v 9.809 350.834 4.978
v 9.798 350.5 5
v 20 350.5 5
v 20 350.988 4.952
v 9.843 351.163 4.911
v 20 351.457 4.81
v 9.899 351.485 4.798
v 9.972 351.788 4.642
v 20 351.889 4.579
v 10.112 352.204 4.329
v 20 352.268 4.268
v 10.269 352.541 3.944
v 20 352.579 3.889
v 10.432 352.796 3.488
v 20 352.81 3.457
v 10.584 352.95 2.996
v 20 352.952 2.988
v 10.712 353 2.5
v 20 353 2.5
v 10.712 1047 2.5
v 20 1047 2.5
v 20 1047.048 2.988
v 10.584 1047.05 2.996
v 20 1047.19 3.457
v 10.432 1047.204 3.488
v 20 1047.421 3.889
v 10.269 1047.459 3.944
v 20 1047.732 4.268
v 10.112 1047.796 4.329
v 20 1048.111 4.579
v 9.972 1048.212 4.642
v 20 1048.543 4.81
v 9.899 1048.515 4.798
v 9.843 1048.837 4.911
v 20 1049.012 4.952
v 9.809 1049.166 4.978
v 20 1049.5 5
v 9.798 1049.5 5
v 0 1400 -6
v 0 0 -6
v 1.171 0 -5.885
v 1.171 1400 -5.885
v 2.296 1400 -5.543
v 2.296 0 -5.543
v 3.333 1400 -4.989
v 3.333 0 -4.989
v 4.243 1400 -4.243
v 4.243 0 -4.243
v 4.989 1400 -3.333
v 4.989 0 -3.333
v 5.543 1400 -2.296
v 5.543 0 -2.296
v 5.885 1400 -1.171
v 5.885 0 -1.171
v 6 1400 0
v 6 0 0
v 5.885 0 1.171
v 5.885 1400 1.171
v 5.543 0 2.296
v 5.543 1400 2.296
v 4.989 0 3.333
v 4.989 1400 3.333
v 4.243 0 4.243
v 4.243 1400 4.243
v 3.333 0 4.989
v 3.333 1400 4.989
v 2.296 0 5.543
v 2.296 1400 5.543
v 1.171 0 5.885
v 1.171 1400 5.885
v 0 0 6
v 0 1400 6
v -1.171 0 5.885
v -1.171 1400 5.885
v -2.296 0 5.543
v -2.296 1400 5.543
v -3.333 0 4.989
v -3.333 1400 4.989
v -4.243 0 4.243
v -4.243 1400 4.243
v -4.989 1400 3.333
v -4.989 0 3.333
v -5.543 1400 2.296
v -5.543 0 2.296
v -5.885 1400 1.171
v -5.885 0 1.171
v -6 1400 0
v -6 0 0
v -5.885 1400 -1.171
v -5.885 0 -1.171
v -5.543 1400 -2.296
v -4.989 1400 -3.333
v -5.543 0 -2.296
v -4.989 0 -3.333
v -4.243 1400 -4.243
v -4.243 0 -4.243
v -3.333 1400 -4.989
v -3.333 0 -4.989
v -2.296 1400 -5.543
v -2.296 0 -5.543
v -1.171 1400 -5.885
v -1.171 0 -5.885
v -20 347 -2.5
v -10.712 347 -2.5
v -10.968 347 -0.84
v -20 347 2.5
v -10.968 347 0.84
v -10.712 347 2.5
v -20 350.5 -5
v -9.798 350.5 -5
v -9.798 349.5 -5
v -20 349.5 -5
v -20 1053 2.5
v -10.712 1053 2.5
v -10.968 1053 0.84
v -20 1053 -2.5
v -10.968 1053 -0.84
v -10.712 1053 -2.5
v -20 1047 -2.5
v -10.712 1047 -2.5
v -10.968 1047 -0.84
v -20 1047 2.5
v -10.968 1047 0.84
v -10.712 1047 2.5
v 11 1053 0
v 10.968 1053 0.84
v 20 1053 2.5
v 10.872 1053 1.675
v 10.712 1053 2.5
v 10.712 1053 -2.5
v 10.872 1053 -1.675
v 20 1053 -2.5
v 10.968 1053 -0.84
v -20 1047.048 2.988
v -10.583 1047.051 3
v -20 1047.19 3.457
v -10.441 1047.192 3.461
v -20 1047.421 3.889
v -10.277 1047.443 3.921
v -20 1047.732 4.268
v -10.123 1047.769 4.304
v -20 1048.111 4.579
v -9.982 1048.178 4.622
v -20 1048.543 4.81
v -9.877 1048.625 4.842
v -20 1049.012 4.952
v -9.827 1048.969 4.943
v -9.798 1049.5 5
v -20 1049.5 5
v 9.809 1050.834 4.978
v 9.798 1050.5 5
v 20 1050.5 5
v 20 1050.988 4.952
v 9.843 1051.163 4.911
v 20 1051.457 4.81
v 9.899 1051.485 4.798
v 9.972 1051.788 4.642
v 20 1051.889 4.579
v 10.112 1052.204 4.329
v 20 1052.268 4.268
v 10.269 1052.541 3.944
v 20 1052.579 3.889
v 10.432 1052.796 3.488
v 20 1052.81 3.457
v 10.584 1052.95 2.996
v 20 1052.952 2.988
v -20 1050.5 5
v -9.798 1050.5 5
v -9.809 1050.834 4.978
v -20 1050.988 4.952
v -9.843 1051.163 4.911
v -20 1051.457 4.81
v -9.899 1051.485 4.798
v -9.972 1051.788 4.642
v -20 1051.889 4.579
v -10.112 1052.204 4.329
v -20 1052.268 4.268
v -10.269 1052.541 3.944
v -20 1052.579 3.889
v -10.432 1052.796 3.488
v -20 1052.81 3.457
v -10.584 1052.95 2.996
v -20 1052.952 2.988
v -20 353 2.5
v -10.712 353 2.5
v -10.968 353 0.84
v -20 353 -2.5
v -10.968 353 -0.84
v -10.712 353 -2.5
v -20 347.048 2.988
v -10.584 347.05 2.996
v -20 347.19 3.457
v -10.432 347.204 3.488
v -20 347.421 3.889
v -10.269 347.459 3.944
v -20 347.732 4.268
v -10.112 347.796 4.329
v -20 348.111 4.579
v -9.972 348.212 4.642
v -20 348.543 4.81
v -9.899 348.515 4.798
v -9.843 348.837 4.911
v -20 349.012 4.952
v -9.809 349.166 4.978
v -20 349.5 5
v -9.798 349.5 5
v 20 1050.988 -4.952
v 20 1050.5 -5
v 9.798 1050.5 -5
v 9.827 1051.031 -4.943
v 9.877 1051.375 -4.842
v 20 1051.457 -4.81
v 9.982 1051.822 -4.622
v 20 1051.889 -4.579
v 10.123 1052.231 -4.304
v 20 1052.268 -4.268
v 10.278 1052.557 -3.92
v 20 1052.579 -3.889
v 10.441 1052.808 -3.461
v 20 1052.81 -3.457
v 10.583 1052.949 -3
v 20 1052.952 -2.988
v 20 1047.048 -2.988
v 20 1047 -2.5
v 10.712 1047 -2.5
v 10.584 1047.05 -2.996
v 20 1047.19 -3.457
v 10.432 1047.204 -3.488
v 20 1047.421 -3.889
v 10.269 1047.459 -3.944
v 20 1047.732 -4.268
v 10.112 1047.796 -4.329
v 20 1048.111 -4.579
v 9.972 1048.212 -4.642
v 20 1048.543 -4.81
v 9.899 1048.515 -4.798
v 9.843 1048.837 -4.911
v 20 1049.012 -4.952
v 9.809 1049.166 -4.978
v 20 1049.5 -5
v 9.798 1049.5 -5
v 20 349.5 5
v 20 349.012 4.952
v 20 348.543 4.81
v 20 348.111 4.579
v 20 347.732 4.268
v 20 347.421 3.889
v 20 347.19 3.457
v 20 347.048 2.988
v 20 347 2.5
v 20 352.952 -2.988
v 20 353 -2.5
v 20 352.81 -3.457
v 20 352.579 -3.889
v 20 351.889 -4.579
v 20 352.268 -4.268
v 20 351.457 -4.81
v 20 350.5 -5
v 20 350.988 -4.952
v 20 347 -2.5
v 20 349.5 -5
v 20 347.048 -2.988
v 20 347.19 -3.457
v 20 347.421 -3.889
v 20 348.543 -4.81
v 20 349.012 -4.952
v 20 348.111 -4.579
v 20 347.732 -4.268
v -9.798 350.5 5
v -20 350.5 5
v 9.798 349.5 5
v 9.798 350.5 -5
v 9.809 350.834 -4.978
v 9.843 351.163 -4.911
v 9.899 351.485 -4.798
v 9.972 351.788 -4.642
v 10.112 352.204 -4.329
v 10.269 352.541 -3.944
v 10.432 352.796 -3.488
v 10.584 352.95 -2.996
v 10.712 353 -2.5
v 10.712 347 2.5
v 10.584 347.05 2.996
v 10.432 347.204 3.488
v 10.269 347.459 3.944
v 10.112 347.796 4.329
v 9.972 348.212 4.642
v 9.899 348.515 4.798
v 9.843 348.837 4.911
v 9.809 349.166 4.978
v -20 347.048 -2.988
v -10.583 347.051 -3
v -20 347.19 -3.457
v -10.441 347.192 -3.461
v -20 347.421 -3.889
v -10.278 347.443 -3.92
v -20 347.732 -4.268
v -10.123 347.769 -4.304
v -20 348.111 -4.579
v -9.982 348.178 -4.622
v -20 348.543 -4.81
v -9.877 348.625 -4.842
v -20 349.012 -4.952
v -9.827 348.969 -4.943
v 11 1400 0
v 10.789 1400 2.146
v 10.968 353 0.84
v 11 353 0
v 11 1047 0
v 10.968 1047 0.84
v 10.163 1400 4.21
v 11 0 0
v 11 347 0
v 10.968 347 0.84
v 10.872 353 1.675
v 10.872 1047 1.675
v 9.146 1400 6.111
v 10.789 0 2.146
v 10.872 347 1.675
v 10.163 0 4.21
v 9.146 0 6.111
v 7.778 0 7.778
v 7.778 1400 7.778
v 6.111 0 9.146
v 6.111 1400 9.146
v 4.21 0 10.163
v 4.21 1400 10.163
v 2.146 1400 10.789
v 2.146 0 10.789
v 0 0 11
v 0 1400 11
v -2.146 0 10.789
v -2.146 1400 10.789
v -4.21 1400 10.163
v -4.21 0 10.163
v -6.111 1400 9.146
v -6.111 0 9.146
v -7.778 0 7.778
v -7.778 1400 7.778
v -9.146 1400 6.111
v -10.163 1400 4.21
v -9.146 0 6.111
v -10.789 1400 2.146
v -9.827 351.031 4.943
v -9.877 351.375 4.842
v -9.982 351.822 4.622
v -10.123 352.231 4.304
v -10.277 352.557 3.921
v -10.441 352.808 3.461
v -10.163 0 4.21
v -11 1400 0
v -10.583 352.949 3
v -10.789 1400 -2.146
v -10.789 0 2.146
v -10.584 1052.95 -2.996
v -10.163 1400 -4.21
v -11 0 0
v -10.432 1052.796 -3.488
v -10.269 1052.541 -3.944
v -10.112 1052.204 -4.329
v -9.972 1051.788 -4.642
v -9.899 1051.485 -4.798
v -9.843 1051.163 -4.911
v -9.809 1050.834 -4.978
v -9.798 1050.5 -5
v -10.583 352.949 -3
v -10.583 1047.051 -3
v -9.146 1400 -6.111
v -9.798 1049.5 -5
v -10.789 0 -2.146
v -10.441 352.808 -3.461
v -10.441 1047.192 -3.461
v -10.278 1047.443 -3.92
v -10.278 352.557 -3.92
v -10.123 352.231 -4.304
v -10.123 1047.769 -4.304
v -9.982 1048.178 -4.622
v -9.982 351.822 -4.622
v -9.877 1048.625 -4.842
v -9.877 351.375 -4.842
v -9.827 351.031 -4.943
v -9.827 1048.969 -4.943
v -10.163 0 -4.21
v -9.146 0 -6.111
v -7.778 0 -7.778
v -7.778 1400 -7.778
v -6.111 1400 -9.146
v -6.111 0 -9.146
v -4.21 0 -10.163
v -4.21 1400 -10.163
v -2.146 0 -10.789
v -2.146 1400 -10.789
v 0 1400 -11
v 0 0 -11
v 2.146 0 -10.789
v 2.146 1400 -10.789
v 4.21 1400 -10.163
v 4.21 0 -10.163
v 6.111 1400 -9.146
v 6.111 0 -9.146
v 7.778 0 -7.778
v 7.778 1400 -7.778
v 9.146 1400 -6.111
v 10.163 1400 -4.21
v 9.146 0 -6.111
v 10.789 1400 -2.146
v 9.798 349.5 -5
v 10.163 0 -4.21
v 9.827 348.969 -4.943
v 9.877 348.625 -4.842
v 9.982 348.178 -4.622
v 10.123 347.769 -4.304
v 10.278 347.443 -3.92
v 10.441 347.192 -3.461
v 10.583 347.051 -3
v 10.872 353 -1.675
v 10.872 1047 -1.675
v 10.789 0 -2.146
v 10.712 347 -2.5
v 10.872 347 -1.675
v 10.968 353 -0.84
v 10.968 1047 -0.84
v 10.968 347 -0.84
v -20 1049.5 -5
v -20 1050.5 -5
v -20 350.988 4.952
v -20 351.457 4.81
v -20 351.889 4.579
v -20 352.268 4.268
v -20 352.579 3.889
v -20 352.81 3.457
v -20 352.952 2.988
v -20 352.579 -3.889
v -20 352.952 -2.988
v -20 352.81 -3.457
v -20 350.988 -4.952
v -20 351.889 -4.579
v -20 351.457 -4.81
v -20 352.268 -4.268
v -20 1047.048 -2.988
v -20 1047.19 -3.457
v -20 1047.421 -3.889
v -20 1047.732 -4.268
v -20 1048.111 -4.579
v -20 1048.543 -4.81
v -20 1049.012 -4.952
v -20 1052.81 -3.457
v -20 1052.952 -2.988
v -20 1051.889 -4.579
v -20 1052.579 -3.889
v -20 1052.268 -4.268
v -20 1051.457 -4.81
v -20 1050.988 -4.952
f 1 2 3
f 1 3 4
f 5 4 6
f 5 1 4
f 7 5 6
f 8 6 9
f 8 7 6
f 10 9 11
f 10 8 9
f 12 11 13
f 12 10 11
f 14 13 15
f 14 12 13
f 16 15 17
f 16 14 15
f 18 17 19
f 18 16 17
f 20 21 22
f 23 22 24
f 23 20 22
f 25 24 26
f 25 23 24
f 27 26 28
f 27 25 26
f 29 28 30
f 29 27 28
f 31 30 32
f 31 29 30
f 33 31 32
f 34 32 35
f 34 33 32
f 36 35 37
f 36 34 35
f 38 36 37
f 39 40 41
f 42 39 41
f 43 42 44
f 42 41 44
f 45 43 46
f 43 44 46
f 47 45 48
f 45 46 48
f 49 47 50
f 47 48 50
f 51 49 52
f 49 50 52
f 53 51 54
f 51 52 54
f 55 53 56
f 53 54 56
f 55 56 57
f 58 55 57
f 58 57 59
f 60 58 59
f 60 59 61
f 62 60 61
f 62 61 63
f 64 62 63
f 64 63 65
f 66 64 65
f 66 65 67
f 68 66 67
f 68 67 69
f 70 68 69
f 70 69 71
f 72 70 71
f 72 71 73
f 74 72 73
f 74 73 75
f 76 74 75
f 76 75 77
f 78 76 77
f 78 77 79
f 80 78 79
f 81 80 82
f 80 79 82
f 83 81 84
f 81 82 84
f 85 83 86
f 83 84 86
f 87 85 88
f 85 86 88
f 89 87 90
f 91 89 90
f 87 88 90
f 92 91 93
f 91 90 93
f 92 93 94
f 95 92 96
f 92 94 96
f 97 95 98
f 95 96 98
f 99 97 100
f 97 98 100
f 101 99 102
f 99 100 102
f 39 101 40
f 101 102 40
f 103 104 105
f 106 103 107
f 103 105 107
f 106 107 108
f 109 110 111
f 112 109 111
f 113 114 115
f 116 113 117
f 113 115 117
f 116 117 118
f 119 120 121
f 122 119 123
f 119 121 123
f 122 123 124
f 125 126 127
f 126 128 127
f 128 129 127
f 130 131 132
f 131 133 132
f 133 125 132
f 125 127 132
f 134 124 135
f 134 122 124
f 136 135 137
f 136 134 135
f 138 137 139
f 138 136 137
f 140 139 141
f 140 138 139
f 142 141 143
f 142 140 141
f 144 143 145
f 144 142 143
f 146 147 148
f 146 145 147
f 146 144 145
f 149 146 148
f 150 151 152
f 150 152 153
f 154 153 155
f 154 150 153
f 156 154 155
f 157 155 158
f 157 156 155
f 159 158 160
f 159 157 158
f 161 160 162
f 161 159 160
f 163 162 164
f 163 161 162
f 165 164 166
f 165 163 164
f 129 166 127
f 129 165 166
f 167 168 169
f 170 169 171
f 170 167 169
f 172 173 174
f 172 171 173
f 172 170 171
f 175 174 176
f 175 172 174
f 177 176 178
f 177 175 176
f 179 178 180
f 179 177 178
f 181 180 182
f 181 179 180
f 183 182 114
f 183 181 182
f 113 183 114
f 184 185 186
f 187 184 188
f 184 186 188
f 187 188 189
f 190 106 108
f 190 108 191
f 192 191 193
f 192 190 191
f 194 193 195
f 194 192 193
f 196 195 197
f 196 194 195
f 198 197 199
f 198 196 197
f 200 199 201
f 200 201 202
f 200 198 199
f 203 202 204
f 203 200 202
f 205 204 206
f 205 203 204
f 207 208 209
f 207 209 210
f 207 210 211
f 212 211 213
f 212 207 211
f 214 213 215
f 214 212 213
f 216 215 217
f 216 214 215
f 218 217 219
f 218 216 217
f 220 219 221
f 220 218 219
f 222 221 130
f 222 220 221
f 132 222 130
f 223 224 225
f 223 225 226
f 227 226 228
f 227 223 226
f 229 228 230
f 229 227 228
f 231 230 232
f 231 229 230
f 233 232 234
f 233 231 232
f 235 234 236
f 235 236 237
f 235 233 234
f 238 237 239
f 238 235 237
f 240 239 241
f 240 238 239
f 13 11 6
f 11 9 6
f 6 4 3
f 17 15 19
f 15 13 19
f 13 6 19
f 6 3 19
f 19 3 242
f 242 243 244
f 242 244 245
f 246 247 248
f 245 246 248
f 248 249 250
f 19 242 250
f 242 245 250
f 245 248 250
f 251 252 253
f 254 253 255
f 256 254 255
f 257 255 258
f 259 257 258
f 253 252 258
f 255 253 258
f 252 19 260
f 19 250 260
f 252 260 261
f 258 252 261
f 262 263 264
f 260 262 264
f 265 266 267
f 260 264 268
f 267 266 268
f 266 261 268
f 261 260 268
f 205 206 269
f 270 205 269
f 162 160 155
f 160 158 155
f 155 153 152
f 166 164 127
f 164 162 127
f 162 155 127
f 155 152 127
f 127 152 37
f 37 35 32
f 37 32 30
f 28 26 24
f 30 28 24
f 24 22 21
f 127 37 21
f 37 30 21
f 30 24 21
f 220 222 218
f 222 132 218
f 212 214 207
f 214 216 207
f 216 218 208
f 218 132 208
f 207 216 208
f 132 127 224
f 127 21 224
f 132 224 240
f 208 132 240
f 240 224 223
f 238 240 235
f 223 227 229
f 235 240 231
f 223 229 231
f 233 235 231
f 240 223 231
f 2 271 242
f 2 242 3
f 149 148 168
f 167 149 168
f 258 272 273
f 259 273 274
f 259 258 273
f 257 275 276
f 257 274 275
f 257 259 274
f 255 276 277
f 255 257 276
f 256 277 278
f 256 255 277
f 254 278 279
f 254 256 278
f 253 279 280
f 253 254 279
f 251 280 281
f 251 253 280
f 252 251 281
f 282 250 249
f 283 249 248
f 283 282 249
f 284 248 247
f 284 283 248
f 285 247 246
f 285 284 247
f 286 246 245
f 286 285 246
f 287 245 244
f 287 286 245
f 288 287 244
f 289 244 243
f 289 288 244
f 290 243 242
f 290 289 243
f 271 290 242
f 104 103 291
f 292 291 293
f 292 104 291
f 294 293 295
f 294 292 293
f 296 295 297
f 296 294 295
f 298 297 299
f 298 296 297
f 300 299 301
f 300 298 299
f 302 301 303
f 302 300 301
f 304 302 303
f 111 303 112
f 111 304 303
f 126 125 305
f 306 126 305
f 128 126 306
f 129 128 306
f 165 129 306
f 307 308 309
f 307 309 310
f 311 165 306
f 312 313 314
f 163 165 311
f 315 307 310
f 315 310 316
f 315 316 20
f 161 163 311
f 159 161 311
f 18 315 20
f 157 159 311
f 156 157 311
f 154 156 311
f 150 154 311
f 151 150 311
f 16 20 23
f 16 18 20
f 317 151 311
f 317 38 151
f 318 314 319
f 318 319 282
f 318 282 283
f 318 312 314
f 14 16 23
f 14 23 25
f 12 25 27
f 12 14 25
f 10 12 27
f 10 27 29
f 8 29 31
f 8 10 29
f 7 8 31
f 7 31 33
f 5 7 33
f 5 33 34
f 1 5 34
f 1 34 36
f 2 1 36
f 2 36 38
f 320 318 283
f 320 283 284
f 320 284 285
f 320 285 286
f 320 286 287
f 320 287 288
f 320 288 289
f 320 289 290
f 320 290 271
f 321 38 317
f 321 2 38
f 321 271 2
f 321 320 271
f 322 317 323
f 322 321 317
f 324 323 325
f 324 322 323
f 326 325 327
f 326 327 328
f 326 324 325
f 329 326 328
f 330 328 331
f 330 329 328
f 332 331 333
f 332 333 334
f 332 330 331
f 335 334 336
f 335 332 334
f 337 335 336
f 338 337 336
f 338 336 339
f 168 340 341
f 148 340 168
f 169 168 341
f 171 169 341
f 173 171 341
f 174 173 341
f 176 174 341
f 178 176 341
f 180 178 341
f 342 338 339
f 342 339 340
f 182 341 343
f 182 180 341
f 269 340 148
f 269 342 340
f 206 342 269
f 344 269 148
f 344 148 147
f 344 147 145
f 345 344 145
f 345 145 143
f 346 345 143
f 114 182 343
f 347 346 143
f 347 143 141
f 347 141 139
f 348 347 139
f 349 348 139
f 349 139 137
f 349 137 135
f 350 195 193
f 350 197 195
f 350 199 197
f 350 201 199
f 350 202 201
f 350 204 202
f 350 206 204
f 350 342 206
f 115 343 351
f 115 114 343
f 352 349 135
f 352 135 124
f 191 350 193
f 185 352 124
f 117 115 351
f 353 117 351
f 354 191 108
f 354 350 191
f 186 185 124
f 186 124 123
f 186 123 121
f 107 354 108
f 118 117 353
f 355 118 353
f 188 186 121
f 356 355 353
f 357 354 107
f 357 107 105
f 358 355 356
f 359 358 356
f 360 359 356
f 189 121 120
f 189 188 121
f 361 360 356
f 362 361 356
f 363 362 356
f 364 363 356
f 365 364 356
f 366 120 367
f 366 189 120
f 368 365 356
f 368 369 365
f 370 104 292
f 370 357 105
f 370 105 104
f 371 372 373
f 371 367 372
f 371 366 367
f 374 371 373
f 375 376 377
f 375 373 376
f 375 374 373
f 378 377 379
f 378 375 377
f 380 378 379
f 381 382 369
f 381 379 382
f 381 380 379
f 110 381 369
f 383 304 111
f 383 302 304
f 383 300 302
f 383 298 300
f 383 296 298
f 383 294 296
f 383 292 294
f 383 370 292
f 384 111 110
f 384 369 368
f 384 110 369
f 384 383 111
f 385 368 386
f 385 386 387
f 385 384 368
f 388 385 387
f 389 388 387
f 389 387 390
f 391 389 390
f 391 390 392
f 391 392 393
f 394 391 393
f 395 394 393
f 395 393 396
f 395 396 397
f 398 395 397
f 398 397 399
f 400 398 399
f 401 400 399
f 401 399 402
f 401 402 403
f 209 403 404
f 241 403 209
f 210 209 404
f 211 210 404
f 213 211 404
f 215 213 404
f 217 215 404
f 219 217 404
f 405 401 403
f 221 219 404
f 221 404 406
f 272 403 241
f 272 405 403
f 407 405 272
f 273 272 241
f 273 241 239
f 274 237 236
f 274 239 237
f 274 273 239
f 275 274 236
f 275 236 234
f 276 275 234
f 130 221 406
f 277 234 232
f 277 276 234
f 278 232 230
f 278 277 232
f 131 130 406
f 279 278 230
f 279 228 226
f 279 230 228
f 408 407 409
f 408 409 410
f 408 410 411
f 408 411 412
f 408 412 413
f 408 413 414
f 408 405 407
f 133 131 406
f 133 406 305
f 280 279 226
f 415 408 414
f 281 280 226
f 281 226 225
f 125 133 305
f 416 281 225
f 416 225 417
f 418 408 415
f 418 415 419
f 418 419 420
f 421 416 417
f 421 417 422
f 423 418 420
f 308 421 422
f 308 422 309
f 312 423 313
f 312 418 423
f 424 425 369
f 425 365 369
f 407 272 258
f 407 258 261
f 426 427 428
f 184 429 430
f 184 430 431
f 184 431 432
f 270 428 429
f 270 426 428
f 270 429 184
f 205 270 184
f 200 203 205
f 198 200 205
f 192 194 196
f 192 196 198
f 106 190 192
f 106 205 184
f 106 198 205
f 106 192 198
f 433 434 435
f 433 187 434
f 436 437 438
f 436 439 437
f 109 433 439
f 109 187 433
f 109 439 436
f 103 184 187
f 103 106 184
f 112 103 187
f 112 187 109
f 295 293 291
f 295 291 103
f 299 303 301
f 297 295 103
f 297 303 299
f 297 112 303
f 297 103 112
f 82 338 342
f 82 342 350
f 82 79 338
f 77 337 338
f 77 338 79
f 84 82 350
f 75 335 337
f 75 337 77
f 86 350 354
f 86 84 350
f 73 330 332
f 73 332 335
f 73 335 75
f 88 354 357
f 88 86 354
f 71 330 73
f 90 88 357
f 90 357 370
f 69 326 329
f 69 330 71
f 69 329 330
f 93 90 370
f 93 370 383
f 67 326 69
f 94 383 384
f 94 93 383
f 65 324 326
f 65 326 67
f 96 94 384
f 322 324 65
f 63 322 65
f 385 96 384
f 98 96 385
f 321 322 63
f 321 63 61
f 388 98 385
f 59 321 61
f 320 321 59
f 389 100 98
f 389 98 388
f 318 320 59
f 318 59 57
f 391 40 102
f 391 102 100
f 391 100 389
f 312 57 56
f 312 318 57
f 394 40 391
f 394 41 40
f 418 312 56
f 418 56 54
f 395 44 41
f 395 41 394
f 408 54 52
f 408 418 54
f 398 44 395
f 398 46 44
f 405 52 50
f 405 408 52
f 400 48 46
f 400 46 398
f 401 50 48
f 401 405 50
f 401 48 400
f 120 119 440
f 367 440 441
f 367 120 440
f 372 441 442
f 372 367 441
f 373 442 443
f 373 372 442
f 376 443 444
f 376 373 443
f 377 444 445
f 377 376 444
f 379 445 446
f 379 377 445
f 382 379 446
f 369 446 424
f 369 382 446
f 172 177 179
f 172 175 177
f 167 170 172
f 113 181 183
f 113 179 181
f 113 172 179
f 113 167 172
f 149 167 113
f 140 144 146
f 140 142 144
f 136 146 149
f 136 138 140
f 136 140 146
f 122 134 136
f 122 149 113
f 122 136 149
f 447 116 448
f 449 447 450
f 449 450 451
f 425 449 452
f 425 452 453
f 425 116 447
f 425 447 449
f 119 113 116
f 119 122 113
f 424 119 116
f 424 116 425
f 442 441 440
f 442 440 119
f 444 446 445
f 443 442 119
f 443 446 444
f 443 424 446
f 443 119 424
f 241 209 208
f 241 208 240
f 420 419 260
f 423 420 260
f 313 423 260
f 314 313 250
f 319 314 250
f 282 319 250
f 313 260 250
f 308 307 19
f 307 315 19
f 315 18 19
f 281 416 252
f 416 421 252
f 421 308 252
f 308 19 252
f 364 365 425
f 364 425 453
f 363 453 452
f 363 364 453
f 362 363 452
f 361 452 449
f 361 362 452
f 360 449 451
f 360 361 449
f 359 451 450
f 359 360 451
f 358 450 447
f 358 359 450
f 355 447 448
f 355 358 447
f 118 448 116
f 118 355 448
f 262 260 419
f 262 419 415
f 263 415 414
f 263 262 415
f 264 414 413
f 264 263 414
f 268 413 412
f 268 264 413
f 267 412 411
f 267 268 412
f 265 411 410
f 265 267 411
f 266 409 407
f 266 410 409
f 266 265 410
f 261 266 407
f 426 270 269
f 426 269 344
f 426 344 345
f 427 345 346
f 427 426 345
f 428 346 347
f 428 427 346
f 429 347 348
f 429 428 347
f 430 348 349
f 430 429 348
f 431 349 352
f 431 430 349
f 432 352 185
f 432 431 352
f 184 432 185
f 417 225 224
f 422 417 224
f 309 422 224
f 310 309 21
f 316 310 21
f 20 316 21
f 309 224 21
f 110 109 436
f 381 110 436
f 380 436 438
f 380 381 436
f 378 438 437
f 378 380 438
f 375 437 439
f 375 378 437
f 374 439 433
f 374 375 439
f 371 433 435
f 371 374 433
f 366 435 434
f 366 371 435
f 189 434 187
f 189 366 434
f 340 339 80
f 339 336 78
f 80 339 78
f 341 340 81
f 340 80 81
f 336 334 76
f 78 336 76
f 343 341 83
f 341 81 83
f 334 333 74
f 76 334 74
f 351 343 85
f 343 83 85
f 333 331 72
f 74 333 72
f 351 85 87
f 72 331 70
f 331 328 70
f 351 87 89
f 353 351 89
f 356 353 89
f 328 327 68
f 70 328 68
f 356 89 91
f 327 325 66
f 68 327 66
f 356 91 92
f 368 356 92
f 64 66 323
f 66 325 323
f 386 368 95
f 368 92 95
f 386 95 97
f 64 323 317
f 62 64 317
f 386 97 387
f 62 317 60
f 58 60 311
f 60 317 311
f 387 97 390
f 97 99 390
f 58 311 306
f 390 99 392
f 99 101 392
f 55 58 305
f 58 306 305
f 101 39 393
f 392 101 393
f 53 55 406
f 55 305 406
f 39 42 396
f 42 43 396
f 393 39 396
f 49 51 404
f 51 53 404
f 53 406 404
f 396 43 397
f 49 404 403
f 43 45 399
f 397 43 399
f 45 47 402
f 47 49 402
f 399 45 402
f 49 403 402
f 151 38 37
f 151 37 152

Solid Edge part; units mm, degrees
sketch "Sketch1" plane through (0, 0, 0) normal (0, -1, 0) x (1, 0, 0)
  circle A0 centre (0, 0) radius 11
extrude "Protrusion1" add sketch "Sketch1" against normal blind 1400
sketch "Sketch2" plane through (0, 700, 0) normal (-1, 0, 0) x (0, -1, 0)
  line L0 (-353, 5) -> (-353, -5)
  line L1 (-353, -5) -> (-347, -5)
  line L2 (-347, -5) -> (-347, 5)
  line L3 (-347, 5) -> (-353, 5)
extrude "ExtrudedCutout_6" cut sketch "Sketch2" along normal mid plane 270
sketch "Sketch3" plane through (0, 700, 0) normal (-1, 0, 0) x (0, -1, 0)
  line L0 (-347, -5) -> (-347, 5)
  line L1 (-347, 5) -> (-353, 5)
  line L2 (-353, 5) -> (-353, -5)
  line L3 (-353, -5) -> (-347, -5)
extrude "ExtrudedProtrusion_8" add sketch "Sketch3" along normal mid plane 40
sketch "Sketch4" plane through (0, 700, 0) normal (-1, 0, 0) x (0, -1, 0)
  line L0 (347, -5) -> (353, -5)
  line L1 (353, -5) -> (353, 5)
  line L2 (353, 5) -> (347, 5)
  line L3 (347, 5) -> (347, -5)
extrude "ExtrudedCutout_7" cut sketch "Sketch4" along normal mid plane 50
sketch "Sketch5" plane through (0, 700, 0) normal (-1, 0, 0) x (0, -1, 0)
  line L0 (353, -5) -> (353, 5)
  line L1 (353, 5) -> (347, 5)
  line L2 (347, 5) -> (347, -5)
  line L3 (347, -5) -> (353, -5)
extrude "ExtrudedProtrusion_9" add sketch "Sketch5" along normal mid plane 40
hole "Hole_1" at (0, 0, 0) direction (0, 1, 0) diameter 12 end up to next
fillet "Round_1" radius 2.5 8 edges at (14.899, 1053, 5) (14.899, 1047, 5) (14.899, 1053, -5) (14.899, 1047, -5) (-14.899, 1047, 5) (-14.899, 1053, 5) (-14.899, 1053, -5) (-14.899, 1047, -5)
fillet "Round_2" radius 2.5 8 edges at (-14.899, 353, 5) (-14.899, 347, 5) (-14.899, 353, -5) (-14.899, 347, -5) (14.899, 353, 5) (14.899, 347, 5) (14.899, 353, -5) (14.899, 347, -5)
